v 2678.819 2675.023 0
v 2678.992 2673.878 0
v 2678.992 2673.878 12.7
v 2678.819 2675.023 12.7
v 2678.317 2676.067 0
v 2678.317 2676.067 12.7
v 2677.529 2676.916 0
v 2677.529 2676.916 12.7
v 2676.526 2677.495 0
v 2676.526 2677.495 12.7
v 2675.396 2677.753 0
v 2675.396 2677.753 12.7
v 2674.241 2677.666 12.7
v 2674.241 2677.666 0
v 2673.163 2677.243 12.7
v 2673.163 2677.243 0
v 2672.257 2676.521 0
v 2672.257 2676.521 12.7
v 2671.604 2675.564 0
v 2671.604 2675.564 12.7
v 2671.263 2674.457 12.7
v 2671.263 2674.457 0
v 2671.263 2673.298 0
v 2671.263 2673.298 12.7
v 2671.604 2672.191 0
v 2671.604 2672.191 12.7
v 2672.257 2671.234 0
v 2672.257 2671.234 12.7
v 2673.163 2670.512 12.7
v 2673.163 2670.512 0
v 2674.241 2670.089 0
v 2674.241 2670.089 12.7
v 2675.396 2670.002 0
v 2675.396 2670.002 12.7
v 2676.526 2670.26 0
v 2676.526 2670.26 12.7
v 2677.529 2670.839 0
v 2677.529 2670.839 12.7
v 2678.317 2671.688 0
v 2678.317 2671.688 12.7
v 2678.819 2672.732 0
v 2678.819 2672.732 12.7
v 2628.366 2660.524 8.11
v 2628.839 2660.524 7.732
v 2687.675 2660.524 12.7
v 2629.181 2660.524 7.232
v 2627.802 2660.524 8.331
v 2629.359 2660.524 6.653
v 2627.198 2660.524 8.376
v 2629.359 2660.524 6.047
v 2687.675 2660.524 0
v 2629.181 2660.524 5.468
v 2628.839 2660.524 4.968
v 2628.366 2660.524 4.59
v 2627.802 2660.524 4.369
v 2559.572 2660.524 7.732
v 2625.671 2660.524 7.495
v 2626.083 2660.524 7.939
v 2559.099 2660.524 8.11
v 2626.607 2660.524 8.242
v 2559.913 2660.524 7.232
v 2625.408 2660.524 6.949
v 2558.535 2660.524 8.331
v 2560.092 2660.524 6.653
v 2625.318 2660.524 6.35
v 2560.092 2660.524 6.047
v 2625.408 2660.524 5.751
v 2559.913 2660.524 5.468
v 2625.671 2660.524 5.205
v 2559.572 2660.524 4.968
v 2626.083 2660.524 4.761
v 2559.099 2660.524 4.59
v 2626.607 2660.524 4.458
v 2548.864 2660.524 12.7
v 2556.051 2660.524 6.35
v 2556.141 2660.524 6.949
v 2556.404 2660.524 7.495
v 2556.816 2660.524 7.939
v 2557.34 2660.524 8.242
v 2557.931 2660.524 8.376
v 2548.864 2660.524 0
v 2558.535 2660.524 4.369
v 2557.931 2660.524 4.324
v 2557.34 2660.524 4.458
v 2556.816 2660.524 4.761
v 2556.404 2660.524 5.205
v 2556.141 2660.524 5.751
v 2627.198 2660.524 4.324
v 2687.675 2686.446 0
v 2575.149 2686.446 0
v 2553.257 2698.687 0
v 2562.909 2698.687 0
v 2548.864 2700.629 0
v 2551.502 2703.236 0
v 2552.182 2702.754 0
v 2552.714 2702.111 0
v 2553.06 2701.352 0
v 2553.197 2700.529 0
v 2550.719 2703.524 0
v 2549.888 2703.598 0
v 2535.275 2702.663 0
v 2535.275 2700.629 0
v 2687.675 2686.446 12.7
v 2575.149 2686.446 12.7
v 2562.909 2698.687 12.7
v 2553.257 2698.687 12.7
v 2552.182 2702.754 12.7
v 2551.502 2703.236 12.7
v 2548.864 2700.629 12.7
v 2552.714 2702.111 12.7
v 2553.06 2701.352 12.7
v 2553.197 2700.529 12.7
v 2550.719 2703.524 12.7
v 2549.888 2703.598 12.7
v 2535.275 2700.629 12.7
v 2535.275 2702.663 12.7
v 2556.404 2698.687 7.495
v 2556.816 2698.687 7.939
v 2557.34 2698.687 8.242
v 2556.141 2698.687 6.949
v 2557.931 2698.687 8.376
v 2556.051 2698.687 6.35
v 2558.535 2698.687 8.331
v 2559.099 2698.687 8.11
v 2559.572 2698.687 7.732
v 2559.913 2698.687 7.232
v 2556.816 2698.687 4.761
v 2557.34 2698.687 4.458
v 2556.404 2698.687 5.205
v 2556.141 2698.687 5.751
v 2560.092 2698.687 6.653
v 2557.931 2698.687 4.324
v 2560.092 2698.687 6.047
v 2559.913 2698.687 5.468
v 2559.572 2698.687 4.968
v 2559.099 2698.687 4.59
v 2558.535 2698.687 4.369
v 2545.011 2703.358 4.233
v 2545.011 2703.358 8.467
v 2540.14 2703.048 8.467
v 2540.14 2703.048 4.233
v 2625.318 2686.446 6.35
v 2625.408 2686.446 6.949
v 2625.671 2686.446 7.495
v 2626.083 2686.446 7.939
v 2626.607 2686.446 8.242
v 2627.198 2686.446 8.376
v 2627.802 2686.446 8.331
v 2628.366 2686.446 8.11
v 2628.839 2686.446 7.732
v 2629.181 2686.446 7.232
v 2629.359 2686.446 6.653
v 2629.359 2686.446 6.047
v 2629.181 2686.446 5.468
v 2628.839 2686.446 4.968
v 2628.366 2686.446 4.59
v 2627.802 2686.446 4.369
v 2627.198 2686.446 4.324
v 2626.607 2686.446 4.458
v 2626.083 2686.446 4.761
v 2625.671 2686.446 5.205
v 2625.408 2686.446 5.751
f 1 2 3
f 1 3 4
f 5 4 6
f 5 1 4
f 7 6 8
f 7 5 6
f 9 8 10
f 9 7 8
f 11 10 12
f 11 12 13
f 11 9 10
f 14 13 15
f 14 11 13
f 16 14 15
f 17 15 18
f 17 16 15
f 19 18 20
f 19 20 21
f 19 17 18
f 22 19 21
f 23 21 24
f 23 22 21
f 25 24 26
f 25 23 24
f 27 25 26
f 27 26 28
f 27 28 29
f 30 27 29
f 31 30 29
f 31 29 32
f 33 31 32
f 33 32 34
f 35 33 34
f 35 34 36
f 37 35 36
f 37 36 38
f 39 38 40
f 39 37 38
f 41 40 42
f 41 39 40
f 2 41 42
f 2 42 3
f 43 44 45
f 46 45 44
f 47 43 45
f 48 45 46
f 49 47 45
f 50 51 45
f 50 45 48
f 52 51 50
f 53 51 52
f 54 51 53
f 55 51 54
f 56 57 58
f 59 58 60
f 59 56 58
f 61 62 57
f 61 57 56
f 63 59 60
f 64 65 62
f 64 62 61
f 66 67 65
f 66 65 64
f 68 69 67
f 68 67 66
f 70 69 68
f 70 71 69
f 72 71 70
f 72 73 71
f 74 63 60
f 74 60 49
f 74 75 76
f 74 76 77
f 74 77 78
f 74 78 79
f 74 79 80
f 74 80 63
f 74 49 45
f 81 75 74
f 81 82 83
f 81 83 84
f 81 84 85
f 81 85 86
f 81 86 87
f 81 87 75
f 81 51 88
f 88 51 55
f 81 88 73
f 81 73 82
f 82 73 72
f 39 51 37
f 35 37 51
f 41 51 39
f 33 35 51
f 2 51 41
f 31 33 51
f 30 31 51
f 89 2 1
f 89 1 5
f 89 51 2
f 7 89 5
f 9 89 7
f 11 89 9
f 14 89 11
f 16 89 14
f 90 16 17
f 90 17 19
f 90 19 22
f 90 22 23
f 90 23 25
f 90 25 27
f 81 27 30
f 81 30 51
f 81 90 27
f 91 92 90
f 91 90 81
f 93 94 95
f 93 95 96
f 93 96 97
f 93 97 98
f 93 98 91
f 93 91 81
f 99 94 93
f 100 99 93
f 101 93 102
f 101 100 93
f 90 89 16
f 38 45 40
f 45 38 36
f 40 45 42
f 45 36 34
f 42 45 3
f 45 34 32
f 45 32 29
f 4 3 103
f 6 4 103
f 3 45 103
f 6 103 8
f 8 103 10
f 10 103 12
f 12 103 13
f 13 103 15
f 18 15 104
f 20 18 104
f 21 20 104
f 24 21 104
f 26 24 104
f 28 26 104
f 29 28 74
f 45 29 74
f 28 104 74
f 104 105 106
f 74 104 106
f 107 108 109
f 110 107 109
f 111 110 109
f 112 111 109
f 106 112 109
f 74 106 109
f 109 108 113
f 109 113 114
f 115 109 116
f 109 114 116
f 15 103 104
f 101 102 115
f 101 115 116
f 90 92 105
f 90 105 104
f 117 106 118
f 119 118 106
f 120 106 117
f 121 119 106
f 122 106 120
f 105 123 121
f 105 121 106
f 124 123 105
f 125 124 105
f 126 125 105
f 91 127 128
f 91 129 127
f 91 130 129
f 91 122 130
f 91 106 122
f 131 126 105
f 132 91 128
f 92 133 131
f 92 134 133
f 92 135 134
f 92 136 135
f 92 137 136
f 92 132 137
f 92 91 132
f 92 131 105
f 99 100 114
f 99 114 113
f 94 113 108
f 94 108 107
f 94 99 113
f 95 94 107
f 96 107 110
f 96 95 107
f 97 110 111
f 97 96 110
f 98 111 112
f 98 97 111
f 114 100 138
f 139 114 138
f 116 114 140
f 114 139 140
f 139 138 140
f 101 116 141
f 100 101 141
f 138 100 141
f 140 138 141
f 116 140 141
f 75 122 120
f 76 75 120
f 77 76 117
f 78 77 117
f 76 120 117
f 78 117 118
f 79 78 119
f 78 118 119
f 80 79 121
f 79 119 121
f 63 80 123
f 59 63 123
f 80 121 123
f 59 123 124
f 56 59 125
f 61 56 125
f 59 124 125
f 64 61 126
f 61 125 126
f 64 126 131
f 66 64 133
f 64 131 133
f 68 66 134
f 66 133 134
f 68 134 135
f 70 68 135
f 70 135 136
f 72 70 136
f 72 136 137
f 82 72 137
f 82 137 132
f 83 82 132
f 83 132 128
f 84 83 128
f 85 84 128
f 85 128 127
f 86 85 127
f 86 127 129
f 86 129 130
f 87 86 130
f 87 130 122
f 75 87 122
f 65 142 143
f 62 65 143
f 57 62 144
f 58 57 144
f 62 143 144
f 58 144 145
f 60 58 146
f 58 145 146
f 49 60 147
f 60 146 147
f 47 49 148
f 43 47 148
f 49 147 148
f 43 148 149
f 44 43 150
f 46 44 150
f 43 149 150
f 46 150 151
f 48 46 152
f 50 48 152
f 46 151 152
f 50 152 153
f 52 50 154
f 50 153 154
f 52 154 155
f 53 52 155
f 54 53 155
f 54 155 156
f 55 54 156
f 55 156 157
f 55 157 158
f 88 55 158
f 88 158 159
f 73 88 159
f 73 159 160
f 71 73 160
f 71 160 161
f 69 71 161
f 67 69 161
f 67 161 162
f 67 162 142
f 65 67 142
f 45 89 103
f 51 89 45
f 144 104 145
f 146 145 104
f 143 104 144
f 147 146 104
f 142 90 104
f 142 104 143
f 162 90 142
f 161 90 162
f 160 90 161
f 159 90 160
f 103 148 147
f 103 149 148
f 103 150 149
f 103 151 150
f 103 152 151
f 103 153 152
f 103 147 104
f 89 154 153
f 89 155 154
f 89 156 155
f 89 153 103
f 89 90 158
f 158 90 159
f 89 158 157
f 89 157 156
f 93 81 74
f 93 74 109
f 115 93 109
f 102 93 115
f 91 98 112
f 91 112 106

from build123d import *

# Parameters (mm, degrees)
SKETCH1_R           = 3.8862
BOSS_EXTRUDE1_DEPTH = 12.7
SKETCH2_R           = 2.032
CUT_EXTRUDE1_DEPTH  = 2688.829818218
SKETCH3_R           = 2.032
CUT_EXTRUDE2_DEPTH  = 2688.975736213


with BuildPart() as part:
    # Sketch1 → Boss-Extrude1 (new body)
    with BuildSketch(Plane.XY):
        with BuildLine():
            Line((2687.674805049, 2686.446487648), (2687.674805049, 2660.523843887))
            Line((2687.674805049, 2660.523843887), (2548.863805049, 2660.523843887))
            Line((2548.863805049, 2660.523843887), (2548.863805049, 2700.62861103))
            Line((2548.863805049, 2700.62861103), (2535.274805049, 2700.62861103))
            Line((2535.274805049, 2700.62861103), (2535.274805049, 2702.662667964))
            add(Edge.make_bspline(
                [(2549.887954959, 2703.598313804), (2545.009565075, 2703.390230841), (2540.136123501, 2703.088635053), (2535.274805049, 2702.662667964)],
                knots=[10.93644372, 10.93644372, 10.93644372, 10.93644372, 11.514330156, 11.514330156, 11.514330156, 11.514330156], degree=3))
            ThreePointArc((2549.887954959, 2703.598313804), (2552.182411528, 2702.754004596), (2553.196580638, 2700.529403507))
            Line((2553.196580638, 2700.529403507), (2553.256507729, 2698.686786983))
            Line((2553.256507729, 2698.686786983), (2562.908507729, 2698.686786983))
            Line((2562.908507729, 2698.686786983), (2575.148807064, 2686.446487648))
            Line((2575.148807064, 2686.446487648), (2687.674805049, 2686.446487648))
        make_face()
        with Locations((2675.105839614, 2673.877522213)):
            Circle(SKETCH1_R, mode=Mode.SUBTRACT)
    extrude(amount=BOSS_EXTRUDE1_DEPTH)

    # Sketch2 → Cut-Extrude1 (cut, through all)
    with BuildSketch(Plane(origin=(0, 2686.446487648, 0), x_dir=(1, 0, 0), z_dir=(0, 1, 0))):
        with Locations(Location((2627.349805049, -6.35, 0), (0, 0, 180))):
            Circle(SKETCH2_R)
    extrude(amount=-CUT_EXTRUDE1_DEPTH, mode=Mode.SUBTRACT)

    # Sketch3 → Cut-Extrude2 (cut, through all)
    with BuildSketch(Plane(origin=(0, 2698.686786983, 0), x_dir=(1, 0, 0), z_dir=(0, 1, 0))):
        with Locations(Location((2558.082507729, -6.35, 0), (0, 0, 180))):
            Circle(SKETCH3_R)
    extrude(amount=-CUT_EXTRUDE2_DEPTH, mode=Mode.SUBTRACT)


solid = part.part
